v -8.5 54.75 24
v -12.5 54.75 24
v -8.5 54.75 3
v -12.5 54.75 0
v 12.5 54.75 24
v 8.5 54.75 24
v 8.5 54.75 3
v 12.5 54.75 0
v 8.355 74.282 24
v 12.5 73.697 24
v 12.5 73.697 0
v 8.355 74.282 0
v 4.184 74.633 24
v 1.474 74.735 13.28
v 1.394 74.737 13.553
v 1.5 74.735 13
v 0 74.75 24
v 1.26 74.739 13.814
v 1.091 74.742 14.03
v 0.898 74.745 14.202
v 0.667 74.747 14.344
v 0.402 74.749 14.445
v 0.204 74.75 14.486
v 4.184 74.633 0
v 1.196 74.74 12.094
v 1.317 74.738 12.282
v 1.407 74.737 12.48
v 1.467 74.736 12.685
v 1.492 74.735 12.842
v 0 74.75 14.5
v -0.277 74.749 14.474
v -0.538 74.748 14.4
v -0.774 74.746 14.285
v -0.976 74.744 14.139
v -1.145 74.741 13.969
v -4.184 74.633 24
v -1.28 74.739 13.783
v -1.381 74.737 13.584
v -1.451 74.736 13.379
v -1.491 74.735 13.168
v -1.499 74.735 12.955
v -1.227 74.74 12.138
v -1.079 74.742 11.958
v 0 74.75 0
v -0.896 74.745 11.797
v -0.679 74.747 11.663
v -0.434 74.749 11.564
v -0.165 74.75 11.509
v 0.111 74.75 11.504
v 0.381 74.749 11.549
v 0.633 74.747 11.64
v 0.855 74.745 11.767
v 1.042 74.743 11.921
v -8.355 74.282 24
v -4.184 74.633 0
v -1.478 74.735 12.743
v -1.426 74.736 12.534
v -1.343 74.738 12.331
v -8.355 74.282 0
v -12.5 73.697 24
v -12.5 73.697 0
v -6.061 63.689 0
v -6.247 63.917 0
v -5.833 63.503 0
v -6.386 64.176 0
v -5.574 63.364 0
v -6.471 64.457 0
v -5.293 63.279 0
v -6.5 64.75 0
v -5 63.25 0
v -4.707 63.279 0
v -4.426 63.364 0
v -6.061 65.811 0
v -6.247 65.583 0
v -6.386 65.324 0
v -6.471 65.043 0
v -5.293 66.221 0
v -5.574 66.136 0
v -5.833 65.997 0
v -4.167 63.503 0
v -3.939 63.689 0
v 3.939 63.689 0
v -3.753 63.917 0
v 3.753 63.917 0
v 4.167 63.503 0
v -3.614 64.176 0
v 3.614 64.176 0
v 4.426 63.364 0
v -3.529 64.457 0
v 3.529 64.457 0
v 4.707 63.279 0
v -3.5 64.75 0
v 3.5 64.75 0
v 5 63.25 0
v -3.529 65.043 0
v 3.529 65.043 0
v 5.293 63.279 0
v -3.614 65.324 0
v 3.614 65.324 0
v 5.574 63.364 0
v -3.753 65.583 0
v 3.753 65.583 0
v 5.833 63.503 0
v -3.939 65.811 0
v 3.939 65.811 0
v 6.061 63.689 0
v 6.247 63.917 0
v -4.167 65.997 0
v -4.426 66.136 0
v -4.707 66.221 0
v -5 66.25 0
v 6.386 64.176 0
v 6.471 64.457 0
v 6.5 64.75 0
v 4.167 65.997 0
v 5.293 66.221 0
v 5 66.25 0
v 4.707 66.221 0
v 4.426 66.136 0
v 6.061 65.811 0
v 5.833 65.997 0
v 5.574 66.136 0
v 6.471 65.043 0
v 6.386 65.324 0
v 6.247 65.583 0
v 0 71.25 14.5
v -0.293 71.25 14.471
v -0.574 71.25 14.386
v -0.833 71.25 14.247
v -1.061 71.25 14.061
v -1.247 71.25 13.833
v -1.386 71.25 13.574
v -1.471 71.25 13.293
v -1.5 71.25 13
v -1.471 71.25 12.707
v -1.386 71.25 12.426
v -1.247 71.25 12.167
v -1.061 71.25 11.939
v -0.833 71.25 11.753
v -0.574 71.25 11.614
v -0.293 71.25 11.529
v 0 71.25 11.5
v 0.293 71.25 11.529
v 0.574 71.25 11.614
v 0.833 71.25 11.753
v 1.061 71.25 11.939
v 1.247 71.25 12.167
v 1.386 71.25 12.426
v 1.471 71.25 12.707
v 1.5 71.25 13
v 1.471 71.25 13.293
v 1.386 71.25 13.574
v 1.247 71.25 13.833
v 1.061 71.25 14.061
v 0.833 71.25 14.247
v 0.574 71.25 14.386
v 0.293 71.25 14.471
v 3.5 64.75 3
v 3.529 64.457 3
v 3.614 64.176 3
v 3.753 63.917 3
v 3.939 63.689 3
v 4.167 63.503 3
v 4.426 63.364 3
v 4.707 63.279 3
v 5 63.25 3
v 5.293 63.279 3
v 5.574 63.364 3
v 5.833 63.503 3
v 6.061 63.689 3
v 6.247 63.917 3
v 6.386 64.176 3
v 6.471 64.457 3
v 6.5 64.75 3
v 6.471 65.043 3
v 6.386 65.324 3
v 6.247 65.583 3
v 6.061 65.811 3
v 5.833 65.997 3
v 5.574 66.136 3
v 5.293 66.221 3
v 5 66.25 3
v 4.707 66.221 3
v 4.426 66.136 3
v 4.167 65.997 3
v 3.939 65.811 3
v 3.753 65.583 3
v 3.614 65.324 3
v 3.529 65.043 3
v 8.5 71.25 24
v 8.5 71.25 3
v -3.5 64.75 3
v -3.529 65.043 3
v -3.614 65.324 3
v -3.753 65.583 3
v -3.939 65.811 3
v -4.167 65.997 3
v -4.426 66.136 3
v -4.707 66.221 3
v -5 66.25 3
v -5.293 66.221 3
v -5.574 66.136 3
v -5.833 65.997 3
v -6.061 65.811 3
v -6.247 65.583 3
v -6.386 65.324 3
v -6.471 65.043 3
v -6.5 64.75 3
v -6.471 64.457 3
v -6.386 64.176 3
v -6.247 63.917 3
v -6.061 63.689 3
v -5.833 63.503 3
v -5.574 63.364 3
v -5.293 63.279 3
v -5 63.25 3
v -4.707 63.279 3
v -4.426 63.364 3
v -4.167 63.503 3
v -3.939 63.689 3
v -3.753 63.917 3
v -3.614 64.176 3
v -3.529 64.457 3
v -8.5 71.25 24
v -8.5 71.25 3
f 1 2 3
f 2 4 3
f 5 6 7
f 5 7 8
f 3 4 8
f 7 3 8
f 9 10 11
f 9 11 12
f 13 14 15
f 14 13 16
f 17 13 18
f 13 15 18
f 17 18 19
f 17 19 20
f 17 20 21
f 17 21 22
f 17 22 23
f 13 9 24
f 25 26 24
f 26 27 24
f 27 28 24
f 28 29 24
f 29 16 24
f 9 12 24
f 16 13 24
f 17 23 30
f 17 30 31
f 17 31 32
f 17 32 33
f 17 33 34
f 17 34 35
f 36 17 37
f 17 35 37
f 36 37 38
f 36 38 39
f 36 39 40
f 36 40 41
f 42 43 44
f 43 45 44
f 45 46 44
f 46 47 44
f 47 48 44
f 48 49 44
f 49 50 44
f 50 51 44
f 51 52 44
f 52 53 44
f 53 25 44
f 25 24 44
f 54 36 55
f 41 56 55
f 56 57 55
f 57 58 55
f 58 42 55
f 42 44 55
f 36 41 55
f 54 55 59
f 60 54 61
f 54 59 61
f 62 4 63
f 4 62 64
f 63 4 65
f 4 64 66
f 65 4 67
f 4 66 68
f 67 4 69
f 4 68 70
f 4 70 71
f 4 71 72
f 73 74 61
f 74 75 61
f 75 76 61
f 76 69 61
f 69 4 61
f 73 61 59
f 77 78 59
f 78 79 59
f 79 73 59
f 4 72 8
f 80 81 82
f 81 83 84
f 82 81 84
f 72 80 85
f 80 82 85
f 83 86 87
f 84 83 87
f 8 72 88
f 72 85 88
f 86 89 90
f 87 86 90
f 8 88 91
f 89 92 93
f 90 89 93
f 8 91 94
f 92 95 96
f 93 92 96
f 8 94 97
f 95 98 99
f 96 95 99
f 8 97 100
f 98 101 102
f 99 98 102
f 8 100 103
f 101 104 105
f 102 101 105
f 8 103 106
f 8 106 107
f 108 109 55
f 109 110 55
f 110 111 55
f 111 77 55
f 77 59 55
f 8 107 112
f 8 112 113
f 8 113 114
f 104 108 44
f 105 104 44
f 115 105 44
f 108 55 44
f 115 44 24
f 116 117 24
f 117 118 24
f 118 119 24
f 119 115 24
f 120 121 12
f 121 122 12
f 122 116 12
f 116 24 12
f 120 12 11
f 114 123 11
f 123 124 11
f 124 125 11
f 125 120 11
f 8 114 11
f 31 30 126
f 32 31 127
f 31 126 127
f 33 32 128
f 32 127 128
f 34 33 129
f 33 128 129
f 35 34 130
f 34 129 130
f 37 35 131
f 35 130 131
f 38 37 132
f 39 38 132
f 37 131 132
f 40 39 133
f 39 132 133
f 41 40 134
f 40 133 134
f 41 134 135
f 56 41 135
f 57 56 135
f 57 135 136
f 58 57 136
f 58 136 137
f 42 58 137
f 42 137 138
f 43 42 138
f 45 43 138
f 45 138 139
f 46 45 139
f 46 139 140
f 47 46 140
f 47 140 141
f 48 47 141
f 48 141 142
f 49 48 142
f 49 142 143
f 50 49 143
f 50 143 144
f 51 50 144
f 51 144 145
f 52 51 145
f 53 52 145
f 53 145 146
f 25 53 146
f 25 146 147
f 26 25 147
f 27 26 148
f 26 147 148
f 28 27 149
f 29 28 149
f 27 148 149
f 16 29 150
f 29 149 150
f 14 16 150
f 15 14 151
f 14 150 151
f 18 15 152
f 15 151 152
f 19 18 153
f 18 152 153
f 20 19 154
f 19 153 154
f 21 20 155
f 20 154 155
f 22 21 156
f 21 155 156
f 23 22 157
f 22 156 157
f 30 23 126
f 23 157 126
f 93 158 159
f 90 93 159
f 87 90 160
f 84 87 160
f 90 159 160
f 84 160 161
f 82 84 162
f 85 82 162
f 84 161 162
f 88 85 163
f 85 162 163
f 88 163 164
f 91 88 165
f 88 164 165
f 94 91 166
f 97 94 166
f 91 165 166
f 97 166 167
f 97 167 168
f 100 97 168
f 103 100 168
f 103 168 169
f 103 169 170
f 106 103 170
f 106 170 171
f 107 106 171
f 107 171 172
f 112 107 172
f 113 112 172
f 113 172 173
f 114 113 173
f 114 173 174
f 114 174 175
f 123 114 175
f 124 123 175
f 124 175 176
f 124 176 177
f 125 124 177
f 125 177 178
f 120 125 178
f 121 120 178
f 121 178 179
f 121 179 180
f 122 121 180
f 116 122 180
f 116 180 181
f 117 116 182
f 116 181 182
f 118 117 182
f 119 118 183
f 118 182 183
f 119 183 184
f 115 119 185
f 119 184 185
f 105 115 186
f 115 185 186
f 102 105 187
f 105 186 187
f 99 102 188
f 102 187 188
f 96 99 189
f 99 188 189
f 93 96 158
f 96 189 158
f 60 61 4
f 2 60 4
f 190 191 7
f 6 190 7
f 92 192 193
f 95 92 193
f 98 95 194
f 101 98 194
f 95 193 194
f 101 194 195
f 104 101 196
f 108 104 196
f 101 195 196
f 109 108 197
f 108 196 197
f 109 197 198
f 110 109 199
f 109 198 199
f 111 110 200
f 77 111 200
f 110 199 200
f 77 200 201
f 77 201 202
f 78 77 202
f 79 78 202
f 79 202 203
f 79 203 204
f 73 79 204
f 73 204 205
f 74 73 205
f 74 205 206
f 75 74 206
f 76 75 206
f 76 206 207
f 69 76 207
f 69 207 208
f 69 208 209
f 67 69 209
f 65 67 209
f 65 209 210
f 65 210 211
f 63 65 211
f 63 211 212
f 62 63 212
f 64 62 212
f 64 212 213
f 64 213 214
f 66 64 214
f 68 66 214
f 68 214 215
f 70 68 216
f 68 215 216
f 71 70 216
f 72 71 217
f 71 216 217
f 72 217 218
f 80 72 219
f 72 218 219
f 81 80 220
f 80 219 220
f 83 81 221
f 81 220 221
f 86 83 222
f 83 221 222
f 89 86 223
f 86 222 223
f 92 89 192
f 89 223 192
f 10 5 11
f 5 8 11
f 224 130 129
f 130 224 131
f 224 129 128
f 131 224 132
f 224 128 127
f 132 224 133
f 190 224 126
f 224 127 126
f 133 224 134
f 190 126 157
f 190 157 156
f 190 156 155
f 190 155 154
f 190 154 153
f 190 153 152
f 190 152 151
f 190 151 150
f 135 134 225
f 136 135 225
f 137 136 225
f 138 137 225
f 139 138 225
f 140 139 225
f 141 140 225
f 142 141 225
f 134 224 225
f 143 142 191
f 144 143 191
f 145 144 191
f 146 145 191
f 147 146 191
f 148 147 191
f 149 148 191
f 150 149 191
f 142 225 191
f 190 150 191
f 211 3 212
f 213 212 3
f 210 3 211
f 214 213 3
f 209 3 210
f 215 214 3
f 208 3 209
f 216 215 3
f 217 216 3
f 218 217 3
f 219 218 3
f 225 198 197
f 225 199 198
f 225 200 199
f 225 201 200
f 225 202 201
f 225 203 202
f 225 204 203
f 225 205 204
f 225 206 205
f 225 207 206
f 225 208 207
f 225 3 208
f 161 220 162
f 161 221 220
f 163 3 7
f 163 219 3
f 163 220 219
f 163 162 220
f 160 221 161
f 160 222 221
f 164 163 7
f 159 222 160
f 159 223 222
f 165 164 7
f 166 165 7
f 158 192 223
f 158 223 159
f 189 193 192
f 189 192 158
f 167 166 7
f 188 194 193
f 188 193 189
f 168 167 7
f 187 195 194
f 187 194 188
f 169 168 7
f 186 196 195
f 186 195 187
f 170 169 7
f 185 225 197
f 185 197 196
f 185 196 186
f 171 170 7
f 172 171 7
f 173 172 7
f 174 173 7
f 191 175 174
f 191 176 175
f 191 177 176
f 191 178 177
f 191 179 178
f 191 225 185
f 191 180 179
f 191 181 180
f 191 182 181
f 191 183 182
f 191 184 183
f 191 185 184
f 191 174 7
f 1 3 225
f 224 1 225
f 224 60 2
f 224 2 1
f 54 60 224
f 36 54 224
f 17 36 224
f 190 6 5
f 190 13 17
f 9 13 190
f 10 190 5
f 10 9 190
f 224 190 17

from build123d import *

# Parameters (mm, degrees)
F1_DEPTH = 3
F3_DEPTH = 21
F4_R     = 1.5
F5_DEPTH = 4
F7_DEPTH = 5


with BuildPart() as f1:
    # F0 (on Top) → F1 (new body)
    with BuildSketch(Plane.XY):
        with BuildLine():
            Line((12.5, 54.75), (12.5, 73.697439))
            ThreePointArc((12.5, 73.697439), (0, 74.75), (-12.5, 73.697439))
            Line((-12.5, 73.697439), (-12.5, 54.75))
            Line((-12.5, 54.75), (8.383245, 54.75))
            Line((8.383245, 54.75), (12.5, 54.75))
        make_face()
    extrude(amount=F1_DEPTH)

    # F2 (on face) → F3 (join)
    with BuildSketch(Plane.XY.offset(3)):
        with BuildLine():
            Line((-12.5, 73.697439), (-12.5, 54.75))
            Line((-12.5, 54.75), (-8.5, 54.75))
            Line((-8.5, 54.75), (-8.5, 71.25))
            Line((-8.5, 71.25), (8.5, 71.25))
            Line((8.5, 71.25), (8.5, 54.75))
            Line((8.5, 54.75), (12.5, 54.75))
            Line((12.5, 54.75), (12.5, 73.697439))
            ThreePointArc((12.5, 73.697439), (0, 74.75), (-12.5, 73.697439))
        make_face()
    extrude(amount=F3_DEPTH)

    # F4 (on face) → F5 (cut)
    with BuildSketch(Plane.XY.offset(3)):
        with BuildLine():
            ThreePointArc((6.5, 64.75), (5, 66.25), (3.5, 64.75))
            ThreePointArc((3.5, 64.75), (5, 63.25), (6.5, 64.75))
        make_face()
        with Locations((-5, 64.75)):
            Circle(F4_R)
    extrude(amount=-F5_DEPTH, mode=Mode.SUBTRACT)

    # F6 (on face) → F7 (cut)
    with BuildSketch(Plane.XZ.offset(-71.25)):
        with BuildLine():
            ThreePointArc((1.5, 13), (1.06066, 14.06066), (0, 14.5))
            ThreePointArc((0, 14.5), (-1.06066, 11.93934), (1.5, 13))
        make_face()
    extrude(amount=-F7_DEPTH, mode=Mode.SUBTRACT)


solid = f1.part
